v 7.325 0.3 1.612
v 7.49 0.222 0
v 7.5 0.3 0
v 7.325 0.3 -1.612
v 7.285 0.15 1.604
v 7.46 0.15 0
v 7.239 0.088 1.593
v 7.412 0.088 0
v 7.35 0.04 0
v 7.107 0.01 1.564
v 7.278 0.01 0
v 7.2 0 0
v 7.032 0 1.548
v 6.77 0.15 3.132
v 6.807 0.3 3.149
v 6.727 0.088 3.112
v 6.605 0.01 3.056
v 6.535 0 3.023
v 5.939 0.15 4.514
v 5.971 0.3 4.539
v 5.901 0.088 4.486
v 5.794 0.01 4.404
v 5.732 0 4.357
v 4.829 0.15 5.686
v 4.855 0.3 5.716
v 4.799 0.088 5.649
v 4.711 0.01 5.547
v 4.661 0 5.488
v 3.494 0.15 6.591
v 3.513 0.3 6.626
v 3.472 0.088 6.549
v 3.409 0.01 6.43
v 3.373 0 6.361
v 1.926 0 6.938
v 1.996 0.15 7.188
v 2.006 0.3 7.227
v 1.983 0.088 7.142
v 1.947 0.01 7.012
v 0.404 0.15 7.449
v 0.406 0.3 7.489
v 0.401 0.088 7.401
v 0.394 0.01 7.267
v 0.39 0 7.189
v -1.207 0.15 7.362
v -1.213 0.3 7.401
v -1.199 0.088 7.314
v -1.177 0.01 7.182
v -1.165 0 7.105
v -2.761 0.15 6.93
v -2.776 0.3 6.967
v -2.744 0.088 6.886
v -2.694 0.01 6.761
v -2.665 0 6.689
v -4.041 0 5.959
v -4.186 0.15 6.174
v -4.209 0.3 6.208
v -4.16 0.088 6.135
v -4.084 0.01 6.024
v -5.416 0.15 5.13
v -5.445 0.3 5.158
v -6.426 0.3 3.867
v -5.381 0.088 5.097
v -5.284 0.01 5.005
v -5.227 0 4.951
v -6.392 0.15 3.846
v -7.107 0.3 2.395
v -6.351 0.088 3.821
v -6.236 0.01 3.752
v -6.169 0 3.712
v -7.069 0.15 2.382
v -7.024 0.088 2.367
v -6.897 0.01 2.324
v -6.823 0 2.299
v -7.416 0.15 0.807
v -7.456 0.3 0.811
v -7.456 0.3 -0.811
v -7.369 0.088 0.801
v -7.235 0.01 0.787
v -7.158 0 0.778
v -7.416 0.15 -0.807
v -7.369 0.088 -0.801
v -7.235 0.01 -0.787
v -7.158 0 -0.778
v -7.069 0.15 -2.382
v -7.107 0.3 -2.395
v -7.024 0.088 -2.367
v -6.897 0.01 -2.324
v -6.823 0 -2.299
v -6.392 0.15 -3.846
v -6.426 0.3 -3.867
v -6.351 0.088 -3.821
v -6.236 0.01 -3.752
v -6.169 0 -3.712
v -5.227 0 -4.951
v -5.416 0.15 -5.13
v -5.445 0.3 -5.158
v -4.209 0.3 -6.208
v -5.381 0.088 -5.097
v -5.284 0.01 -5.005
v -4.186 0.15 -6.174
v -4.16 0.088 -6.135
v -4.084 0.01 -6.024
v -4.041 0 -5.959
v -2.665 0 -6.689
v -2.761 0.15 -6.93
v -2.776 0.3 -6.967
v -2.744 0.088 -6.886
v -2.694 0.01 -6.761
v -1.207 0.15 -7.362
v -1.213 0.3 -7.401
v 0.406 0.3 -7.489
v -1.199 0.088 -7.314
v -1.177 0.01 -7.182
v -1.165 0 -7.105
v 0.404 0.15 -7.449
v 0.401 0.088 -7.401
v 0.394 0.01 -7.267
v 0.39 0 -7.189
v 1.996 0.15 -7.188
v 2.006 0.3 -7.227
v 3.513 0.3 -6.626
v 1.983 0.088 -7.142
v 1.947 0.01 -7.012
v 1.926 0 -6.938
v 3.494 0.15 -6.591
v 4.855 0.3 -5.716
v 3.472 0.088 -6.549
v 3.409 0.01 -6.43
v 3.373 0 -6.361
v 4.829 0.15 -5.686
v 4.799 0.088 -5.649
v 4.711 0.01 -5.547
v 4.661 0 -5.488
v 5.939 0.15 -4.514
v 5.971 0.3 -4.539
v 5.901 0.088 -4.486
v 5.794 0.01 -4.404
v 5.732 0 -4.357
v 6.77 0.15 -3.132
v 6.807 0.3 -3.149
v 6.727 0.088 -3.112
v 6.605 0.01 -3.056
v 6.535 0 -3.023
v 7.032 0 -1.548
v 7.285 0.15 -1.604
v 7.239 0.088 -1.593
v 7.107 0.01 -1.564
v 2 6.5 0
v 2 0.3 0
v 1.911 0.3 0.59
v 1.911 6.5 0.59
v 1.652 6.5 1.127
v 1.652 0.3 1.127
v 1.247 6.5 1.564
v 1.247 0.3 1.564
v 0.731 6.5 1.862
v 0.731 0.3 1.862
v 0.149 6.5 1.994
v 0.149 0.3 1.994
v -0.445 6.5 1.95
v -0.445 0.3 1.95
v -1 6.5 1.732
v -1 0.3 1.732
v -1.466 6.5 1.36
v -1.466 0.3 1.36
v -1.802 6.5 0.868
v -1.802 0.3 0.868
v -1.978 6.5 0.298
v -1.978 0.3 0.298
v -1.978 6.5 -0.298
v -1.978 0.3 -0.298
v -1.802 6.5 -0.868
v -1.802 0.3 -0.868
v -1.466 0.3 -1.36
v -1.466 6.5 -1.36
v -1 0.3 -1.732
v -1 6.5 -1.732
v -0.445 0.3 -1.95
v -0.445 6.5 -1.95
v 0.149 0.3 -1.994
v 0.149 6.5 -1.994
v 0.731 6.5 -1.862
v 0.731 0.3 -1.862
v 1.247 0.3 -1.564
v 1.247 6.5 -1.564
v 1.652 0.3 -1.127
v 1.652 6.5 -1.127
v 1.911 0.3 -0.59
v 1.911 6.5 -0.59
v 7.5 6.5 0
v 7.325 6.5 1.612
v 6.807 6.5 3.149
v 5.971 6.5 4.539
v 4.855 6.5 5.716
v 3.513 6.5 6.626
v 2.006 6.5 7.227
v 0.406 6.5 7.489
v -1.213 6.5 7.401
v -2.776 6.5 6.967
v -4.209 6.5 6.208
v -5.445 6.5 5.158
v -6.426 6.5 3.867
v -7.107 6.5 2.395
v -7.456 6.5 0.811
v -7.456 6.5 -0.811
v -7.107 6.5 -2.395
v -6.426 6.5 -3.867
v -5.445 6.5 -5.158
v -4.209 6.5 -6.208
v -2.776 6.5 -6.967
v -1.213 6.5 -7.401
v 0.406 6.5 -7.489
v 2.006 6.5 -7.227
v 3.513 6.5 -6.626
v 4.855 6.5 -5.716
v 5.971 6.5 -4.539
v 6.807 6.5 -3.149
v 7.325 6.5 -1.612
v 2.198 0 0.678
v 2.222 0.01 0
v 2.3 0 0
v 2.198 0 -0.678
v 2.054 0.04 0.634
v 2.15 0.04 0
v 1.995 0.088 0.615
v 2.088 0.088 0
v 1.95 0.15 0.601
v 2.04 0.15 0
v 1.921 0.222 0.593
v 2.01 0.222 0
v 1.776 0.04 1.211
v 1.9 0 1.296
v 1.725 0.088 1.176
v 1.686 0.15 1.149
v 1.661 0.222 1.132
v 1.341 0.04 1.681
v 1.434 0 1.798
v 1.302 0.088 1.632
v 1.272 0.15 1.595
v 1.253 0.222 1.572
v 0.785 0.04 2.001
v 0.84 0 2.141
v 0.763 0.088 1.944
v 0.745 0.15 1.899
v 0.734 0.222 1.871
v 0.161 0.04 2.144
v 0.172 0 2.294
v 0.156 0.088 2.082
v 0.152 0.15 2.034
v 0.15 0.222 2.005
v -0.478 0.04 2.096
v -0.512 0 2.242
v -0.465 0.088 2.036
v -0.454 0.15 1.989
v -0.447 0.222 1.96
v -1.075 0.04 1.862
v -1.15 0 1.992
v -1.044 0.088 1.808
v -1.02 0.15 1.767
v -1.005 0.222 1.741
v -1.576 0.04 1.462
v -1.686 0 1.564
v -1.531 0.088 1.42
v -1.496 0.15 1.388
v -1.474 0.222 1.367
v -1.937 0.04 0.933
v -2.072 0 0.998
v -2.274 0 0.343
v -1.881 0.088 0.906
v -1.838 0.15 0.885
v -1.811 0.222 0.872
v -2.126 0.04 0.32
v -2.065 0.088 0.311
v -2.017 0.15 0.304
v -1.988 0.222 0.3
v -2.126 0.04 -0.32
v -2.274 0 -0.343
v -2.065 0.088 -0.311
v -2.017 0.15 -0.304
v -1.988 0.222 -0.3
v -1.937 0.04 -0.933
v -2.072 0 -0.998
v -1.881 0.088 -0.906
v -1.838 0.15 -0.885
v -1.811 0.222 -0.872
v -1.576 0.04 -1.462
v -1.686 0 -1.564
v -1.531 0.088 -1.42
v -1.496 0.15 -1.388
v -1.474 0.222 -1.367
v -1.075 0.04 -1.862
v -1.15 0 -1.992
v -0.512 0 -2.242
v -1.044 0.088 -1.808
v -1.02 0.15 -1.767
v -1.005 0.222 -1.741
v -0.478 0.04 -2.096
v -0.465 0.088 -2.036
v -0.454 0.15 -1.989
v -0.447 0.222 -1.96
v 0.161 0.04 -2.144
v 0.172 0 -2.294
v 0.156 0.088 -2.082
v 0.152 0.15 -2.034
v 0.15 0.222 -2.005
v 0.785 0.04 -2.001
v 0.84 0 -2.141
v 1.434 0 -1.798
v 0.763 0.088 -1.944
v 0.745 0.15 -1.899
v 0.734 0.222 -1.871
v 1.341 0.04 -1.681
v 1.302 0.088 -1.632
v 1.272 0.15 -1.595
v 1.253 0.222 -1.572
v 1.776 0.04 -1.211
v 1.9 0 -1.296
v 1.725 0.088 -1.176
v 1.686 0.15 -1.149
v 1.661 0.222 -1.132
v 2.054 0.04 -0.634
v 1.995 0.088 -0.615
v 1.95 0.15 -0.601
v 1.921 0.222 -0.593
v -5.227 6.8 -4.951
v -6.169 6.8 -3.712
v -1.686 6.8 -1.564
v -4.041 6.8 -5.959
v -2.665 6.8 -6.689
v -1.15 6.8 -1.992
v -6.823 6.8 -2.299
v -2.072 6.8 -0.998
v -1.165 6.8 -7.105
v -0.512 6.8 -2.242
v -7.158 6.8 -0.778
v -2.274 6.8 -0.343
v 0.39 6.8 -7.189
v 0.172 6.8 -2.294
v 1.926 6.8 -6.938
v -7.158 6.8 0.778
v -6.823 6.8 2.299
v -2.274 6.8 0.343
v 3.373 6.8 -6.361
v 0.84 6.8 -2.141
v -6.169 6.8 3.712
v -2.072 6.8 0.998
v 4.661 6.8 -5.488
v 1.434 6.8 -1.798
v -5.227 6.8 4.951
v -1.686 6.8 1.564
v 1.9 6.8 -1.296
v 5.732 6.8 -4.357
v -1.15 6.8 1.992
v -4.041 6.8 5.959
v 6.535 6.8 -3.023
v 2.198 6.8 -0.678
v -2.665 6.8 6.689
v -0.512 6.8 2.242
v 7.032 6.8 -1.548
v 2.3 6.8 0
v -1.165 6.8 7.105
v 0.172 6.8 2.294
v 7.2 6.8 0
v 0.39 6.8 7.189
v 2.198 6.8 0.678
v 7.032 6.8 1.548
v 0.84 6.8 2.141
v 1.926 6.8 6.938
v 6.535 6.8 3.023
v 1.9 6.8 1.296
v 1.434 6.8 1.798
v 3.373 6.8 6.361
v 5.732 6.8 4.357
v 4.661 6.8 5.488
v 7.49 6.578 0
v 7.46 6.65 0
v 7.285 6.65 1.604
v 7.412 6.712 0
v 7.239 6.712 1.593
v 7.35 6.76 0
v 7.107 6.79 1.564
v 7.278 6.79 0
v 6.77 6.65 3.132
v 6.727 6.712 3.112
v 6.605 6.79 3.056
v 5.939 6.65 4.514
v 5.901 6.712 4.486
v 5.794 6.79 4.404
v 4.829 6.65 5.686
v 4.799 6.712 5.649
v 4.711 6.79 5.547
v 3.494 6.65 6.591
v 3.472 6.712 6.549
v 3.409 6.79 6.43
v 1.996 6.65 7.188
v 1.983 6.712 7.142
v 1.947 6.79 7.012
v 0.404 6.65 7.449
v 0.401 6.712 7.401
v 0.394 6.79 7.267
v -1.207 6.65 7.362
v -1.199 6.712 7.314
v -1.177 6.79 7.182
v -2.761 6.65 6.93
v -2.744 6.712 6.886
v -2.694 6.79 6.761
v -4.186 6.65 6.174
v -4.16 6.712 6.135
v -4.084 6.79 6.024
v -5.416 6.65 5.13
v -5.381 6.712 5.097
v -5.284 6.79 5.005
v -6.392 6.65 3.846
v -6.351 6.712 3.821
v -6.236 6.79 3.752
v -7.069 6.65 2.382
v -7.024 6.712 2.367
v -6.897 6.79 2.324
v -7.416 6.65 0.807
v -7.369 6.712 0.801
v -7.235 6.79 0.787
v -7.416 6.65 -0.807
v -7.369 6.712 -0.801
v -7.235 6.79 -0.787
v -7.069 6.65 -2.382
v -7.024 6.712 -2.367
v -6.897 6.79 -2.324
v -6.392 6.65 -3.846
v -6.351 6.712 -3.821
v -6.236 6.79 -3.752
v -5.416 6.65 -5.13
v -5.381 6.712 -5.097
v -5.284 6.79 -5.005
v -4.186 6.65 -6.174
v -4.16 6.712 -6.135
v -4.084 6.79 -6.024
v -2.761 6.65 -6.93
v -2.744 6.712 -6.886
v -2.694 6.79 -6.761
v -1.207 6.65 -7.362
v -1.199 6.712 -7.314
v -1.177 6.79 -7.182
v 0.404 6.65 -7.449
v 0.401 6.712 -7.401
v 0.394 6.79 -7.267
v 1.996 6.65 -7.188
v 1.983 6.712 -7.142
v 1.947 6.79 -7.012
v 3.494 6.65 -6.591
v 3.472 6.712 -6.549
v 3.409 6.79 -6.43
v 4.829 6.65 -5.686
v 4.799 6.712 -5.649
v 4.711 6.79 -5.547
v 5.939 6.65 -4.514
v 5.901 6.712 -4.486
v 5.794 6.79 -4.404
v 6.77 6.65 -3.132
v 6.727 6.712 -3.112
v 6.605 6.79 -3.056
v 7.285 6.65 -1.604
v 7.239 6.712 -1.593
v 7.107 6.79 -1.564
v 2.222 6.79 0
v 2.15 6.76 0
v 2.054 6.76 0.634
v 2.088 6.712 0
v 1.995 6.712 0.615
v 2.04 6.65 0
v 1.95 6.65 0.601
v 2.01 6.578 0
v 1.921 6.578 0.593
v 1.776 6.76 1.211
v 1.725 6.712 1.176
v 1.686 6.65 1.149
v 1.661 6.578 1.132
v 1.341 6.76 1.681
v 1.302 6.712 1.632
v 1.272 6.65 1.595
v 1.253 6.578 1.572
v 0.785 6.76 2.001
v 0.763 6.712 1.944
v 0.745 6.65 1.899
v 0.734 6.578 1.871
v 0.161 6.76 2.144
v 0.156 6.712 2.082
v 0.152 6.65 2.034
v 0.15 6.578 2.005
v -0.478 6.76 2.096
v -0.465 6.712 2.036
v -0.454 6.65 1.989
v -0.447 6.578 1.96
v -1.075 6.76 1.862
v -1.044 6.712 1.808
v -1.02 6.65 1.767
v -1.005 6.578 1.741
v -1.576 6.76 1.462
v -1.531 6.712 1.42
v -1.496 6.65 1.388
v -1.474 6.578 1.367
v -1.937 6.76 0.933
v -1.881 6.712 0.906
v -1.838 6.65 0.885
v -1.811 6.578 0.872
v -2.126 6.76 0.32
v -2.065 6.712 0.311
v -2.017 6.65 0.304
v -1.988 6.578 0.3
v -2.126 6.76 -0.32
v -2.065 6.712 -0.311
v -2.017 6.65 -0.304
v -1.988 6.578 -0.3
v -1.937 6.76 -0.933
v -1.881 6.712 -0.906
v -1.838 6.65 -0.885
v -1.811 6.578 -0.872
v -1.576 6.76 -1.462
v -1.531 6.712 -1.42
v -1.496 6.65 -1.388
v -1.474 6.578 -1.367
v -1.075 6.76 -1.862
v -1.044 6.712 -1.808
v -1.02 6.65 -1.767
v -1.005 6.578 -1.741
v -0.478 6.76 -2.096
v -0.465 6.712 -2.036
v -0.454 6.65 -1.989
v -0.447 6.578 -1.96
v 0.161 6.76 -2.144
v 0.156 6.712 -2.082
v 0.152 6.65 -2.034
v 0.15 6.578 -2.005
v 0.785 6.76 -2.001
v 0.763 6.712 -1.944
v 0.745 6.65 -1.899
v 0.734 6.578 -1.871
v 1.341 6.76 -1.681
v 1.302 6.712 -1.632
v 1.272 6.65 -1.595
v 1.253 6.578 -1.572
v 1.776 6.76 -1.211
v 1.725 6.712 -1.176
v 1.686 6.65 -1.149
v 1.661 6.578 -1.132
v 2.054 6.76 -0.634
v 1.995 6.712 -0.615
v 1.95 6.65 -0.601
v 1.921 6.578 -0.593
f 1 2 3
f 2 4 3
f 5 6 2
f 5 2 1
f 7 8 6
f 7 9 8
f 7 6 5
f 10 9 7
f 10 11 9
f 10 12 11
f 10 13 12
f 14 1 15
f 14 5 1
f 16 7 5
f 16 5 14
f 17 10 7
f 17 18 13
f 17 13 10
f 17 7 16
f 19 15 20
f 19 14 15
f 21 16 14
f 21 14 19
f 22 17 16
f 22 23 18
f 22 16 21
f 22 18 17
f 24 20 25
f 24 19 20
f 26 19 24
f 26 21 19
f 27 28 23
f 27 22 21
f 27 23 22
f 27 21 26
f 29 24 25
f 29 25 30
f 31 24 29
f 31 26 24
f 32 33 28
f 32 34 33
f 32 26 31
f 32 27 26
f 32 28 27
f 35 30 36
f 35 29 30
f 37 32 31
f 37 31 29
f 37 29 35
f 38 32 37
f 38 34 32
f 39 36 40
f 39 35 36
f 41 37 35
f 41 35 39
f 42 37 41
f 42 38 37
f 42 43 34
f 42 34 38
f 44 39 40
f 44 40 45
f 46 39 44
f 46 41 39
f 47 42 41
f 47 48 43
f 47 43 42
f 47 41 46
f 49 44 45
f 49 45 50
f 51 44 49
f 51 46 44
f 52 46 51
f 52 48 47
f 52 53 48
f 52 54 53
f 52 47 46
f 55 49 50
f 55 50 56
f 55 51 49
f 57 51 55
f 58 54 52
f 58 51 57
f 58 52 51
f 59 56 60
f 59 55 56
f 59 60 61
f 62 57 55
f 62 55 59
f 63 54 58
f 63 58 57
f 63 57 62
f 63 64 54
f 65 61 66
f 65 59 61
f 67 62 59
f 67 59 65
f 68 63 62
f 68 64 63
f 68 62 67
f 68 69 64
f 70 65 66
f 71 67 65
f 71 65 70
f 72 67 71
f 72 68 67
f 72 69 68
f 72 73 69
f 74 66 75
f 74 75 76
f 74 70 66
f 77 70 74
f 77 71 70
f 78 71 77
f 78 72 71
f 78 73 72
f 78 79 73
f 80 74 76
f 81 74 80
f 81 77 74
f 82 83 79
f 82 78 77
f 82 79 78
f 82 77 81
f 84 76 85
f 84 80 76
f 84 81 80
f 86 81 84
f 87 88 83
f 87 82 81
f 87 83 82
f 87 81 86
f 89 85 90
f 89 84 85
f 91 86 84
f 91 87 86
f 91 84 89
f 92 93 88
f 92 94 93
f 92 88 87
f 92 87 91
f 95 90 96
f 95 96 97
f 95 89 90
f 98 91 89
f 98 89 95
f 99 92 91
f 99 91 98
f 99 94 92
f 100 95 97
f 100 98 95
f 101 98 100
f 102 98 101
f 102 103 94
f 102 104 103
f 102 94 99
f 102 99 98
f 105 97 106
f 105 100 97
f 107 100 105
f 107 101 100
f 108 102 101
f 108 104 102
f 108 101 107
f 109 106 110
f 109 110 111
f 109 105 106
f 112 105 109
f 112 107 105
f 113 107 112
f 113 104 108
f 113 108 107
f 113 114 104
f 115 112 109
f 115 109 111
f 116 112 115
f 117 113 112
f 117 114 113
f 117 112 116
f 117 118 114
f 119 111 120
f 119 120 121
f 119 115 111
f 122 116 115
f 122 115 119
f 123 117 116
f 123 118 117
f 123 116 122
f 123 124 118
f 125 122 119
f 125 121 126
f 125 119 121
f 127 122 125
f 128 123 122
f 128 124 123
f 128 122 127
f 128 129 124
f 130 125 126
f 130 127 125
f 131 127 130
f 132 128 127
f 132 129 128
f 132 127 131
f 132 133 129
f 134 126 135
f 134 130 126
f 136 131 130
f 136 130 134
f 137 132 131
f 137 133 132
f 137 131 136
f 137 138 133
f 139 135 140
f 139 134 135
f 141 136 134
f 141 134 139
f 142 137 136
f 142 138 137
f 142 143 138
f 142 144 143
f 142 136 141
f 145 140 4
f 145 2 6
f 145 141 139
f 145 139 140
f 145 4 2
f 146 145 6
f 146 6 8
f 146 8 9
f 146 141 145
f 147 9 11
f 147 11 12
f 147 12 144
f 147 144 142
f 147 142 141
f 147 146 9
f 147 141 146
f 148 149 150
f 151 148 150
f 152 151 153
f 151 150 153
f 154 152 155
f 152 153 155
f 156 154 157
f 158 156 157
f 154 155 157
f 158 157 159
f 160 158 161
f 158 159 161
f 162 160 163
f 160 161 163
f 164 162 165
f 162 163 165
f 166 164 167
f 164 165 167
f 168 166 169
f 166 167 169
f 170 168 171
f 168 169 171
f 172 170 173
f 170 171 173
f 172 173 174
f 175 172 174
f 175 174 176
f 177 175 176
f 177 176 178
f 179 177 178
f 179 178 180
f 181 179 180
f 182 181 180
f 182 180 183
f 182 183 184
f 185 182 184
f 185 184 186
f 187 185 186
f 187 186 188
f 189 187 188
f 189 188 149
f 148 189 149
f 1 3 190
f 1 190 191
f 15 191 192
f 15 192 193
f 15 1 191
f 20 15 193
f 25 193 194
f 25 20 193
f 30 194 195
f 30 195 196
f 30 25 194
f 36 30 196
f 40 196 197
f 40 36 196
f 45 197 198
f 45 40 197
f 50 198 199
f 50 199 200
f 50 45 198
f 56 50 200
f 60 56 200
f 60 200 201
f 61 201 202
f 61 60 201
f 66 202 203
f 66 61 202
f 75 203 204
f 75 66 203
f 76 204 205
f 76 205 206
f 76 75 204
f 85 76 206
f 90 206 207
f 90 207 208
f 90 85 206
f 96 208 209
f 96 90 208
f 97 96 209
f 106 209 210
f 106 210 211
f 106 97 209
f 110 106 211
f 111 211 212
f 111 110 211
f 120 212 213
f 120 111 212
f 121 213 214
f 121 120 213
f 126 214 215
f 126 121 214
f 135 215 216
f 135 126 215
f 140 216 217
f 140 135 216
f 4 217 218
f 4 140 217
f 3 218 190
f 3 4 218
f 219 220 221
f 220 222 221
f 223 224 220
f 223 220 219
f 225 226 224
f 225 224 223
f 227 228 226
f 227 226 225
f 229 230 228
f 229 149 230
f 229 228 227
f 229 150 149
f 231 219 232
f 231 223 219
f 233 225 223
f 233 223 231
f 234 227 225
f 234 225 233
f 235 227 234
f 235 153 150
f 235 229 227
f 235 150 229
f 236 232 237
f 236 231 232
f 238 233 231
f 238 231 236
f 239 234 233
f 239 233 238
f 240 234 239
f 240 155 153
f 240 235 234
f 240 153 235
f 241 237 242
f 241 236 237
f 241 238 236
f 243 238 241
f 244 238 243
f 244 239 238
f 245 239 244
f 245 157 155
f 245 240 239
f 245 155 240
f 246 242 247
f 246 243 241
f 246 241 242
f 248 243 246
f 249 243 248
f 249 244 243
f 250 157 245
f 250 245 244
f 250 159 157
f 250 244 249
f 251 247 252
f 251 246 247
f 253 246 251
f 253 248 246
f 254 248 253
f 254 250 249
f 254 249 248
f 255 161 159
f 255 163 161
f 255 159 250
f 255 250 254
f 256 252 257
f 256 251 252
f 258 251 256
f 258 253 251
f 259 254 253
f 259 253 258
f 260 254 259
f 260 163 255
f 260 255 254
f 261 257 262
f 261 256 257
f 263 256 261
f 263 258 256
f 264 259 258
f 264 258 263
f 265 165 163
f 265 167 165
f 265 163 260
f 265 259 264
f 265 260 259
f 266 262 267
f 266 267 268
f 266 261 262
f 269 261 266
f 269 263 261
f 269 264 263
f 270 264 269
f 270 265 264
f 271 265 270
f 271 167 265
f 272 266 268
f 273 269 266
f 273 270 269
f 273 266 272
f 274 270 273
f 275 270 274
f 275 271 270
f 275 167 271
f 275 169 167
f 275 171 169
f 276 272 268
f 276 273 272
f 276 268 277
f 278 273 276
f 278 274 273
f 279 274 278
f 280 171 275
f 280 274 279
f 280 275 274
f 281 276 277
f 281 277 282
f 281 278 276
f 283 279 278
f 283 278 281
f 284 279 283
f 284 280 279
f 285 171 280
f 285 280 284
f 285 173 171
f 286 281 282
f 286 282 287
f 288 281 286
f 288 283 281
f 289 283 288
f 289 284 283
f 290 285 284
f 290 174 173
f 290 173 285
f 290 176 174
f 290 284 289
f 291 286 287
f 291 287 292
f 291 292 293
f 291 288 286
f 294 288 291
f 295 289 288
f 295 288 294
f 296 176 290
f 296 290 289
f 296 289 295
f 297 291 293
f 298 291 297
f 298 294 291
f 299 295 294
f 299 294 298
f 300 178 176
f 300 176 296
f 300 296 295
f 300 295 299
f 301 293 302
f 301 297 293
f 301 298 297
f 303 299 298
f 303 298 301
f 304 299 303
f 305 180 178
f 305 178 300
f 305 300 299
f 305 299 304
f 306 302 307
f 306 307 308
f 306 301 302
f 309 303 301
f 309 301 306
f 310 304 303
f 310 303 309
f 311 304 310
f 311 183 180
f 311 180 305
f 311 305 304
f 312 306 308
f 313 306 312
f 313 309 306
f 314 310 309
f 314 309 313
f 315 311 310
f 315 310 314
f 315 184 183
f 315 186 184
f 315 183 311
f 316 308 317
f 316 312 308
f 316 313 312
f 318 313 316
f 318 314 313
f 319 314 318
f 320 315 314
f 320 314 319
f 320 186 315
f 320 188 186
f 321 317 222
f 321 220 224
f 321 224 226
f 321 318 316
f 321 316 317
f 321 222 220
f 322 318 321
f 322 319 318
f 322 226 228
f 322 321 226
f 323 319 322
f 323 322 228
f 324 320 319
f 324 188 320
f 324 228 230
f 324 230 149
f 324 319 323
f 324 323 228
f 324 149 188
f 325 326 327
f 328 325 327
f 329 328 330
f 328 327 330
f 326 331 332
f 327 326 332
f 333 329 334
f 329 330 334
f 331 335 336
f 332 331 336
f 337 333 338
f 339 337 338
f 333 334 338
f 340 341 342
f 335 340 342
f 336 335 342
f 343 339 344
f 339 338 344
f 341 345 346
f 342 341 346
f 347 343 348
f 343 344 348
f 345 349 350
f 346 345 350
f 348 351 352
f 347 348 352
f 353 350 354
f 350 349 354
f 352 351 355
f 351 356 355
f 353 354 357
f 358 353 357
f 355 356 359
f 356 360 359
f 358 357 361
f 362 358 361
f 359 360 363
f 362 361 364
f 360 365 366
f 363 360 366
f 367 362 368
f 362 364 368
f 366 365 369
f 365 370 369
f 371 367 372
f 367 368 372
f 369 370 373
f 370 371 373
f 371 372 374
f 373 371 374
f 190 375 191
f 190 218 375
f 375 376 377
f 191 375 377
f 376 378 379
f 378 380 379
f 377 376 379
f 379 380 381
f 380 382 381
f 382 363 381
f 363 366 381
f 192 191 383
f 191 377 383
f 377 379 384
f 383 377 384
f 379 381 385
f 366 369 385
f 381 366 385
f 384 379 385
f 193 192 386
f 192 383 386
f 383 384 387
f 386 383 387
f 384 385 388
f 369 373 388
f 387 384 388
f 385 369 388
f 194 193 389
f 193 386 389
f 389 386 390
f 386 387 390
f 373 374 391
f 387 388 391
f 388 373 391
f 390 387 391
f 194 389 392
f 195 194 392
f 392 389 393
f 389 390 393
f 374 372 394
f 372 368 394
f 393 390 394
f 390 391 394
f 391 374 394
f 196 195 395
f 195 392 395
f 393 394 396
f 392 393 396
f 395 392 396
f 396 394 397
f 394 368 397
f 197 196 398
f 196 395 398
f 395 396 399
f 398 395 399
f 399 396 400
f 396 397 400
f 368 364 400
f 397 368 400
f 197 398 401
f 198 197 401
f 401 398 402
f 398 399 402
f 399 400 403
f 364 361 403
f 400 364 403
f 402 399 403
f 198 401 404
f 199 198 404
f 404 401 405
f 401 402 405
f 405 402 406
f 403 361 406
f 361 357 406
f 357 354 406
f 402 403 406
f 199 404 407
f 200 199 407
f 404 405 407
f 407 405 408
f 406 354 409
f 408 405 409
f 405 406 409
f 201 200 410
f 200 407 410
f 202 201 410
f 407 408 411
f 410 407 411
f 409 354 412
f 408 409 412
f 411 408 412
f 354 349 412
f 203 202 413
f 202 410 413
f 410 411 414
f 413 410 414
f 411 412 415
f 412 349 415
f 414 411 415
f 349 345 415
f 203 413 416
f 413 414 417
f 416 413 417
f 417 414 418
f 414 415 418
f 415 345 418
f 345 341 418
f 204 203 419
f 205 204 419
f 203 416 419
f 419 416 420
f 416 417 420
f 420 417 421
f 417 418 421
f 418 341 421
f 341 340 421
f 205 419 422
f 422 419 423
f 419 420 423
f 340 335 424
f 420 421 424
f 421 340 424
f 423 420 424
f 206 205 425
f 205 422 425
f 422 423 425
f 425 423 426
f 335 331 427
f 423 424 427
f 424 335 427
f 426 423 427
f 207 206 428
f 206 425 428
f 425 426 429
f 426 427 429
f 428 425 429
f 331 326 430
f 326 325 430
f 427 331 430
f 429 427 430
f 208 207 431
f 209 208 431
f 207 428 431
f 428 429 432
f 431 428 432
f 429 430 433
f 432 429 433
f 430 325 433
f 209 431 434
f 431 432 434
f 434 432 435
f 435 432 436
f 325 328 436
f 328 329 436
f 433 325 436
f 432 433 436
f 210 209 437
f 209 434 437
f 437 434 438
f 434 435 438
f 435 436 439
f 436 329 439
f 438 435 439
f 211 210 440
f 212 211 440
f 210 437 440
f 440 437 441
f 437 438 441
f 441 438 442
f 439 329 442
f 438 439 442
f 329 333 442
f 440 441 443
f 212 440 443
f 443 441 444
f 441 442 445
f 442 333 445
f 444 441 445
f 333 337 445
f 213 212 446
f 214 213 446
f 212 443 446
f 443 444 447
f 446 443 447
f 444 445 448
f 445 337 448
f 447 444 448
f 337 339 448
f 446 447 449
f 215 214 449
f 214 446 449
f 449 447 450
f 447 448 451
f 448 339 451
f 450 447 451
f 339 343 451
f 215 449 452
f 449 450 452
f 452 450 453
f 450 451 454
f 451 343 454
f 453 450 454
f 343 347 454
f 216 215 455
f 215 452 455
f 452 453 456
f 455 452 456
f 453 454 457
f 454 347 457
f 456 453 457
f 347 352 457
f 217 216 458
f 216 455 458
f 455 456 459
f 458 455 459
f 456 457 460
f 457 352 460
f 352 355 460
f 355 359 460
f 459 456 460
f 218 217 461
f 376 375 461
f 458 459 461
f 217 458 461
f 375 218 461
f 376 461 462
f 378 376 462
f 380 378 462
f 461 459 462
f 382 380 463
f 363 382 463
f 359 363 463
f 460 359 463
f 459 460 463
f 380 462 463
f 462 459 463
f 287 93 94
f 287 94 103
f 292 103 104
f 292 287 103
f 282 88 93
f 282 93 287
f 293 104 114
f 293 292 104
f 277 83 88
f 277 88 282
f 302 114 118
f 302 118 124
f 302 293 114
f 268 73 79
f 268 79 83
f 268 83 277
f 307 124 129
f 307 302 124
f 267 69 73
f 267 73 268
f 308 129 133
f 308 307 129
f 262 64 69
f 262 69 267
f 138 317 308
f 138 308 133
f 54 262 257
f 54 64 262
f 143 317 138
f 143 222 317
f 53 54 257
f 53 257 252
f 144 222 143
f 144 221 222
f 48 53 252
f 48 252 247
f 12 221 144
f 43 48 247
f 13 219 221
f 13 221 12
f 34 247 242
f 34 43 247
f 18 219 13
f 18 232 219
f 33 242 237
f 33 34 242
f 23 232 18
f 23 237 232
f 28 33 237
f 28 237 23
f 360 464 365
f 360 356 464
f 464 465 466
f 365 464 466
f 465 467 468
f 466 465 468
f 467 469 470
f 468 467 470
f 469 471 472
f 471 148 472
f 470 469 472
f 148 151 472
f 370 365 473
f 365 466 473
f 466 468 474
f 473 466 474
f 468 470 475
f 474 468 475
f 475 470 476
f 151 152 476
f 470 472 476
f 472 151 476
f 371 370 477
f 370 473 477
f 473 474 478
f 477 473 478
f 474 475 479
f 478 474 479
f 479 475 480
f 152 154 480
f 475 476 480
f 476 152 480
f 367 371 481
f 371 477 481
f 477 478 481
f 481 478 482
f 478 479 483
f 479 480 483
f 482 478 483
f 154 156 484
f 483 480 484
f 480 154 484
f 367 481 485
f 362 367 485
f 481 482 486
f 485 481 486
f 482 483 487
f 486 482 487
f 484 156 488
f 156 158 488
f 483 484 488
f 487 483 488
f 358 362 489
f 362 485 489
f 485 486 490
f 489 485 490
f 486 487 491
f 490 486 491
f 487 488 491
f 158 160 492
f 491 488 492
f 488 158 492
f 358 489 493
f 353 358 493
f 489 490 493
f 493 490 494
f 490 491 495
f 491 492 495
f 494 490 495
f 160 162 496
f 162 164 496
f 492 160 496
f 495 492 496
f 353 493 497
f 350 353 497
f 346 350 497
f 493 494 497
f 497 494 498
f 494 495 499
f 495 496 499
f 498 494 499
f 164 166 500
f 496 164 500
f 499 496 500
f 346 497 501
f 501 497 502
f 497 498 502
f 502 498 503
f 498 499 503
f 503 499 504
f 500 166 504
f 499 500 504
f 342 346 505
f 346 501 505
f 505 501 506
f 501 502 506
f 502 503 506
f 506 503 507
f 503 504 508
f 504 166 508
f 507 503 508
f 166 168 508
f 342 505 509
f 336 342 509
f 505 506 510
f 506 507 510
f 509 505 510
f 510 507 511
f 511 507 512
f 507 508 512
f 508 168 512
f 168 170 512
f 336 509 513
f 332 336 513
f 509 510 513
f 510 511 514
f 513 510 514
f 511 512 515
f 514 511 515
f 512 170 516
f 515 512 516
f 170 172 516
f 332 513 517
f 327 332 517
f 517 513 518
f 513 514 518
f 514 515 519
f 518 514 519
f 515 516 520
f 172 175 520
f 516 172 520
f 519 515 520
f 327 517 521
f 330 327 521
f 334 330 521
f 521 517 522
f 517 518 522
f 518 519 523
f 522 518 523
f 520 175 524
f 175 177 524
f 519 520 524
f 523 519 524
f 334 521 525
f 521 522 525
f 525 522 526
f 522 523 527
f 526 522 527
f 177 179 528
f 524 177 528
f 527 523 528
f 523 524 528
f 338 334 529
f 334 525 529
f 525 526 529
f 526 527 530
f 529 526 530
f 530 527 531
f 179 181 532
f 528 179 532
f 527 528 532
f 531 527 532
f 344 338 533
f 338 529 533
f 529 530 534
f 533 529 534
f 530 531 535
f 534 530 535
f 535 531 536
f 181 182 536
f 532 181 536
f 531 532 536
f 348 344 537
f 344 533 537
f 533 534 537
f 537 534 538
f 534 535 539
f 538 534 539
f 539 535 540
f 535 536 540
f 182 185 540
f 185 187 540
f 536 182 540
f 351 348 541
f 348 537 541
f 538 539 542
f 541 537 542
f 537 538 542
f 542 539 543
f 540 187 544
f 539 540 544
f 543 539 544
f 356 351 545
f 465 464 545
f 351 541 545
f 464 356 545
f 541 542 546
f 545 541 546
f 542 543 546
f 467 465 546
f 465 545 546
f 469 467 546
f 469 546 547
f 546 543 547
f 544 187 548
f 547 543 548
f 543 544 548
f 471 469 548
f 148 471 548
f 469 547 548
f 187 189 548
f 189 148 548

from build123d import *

# Parameters (mm, degrees)
F0_R     = 7.5
F1_DEPTH = 6.8
F2_R     = 2
F3_DEPTH = 24.4
F4_R     = 0.3
F5_R     = 0.3


with BuildPart() as f1:
    # F0 (on Front) → F1 (new body)
    with BuildSketch(Plane.XZ):
        Circle(F0_R)
    extrude(amount=-F1_DEPTH)

    # F2 (on face) → F3 (cut)
    with BuildSketch(Plane.XZ):
        Circle(F2_R)
    extrude(amount=-F3_DEPTH, mode=Mode.SUBTRACT)

    # F4
    f4_edges = [f1.edges().sort_by_distance(p)[0] for p in [
        (-7.5, 0, 0),
        (-2, 0, 0),
        (-7.5, 6.8, 0),
    ]]
    fillet(f4_edges, radius=F4_R)

    # F5
    f5_edges = [f1.edges().sort_by_distance(p)[0] for p in [
        (-2, 6.8, 0),
    ]]
    fillet(f5_edges, radius=F5_R)


solid = f1.part
